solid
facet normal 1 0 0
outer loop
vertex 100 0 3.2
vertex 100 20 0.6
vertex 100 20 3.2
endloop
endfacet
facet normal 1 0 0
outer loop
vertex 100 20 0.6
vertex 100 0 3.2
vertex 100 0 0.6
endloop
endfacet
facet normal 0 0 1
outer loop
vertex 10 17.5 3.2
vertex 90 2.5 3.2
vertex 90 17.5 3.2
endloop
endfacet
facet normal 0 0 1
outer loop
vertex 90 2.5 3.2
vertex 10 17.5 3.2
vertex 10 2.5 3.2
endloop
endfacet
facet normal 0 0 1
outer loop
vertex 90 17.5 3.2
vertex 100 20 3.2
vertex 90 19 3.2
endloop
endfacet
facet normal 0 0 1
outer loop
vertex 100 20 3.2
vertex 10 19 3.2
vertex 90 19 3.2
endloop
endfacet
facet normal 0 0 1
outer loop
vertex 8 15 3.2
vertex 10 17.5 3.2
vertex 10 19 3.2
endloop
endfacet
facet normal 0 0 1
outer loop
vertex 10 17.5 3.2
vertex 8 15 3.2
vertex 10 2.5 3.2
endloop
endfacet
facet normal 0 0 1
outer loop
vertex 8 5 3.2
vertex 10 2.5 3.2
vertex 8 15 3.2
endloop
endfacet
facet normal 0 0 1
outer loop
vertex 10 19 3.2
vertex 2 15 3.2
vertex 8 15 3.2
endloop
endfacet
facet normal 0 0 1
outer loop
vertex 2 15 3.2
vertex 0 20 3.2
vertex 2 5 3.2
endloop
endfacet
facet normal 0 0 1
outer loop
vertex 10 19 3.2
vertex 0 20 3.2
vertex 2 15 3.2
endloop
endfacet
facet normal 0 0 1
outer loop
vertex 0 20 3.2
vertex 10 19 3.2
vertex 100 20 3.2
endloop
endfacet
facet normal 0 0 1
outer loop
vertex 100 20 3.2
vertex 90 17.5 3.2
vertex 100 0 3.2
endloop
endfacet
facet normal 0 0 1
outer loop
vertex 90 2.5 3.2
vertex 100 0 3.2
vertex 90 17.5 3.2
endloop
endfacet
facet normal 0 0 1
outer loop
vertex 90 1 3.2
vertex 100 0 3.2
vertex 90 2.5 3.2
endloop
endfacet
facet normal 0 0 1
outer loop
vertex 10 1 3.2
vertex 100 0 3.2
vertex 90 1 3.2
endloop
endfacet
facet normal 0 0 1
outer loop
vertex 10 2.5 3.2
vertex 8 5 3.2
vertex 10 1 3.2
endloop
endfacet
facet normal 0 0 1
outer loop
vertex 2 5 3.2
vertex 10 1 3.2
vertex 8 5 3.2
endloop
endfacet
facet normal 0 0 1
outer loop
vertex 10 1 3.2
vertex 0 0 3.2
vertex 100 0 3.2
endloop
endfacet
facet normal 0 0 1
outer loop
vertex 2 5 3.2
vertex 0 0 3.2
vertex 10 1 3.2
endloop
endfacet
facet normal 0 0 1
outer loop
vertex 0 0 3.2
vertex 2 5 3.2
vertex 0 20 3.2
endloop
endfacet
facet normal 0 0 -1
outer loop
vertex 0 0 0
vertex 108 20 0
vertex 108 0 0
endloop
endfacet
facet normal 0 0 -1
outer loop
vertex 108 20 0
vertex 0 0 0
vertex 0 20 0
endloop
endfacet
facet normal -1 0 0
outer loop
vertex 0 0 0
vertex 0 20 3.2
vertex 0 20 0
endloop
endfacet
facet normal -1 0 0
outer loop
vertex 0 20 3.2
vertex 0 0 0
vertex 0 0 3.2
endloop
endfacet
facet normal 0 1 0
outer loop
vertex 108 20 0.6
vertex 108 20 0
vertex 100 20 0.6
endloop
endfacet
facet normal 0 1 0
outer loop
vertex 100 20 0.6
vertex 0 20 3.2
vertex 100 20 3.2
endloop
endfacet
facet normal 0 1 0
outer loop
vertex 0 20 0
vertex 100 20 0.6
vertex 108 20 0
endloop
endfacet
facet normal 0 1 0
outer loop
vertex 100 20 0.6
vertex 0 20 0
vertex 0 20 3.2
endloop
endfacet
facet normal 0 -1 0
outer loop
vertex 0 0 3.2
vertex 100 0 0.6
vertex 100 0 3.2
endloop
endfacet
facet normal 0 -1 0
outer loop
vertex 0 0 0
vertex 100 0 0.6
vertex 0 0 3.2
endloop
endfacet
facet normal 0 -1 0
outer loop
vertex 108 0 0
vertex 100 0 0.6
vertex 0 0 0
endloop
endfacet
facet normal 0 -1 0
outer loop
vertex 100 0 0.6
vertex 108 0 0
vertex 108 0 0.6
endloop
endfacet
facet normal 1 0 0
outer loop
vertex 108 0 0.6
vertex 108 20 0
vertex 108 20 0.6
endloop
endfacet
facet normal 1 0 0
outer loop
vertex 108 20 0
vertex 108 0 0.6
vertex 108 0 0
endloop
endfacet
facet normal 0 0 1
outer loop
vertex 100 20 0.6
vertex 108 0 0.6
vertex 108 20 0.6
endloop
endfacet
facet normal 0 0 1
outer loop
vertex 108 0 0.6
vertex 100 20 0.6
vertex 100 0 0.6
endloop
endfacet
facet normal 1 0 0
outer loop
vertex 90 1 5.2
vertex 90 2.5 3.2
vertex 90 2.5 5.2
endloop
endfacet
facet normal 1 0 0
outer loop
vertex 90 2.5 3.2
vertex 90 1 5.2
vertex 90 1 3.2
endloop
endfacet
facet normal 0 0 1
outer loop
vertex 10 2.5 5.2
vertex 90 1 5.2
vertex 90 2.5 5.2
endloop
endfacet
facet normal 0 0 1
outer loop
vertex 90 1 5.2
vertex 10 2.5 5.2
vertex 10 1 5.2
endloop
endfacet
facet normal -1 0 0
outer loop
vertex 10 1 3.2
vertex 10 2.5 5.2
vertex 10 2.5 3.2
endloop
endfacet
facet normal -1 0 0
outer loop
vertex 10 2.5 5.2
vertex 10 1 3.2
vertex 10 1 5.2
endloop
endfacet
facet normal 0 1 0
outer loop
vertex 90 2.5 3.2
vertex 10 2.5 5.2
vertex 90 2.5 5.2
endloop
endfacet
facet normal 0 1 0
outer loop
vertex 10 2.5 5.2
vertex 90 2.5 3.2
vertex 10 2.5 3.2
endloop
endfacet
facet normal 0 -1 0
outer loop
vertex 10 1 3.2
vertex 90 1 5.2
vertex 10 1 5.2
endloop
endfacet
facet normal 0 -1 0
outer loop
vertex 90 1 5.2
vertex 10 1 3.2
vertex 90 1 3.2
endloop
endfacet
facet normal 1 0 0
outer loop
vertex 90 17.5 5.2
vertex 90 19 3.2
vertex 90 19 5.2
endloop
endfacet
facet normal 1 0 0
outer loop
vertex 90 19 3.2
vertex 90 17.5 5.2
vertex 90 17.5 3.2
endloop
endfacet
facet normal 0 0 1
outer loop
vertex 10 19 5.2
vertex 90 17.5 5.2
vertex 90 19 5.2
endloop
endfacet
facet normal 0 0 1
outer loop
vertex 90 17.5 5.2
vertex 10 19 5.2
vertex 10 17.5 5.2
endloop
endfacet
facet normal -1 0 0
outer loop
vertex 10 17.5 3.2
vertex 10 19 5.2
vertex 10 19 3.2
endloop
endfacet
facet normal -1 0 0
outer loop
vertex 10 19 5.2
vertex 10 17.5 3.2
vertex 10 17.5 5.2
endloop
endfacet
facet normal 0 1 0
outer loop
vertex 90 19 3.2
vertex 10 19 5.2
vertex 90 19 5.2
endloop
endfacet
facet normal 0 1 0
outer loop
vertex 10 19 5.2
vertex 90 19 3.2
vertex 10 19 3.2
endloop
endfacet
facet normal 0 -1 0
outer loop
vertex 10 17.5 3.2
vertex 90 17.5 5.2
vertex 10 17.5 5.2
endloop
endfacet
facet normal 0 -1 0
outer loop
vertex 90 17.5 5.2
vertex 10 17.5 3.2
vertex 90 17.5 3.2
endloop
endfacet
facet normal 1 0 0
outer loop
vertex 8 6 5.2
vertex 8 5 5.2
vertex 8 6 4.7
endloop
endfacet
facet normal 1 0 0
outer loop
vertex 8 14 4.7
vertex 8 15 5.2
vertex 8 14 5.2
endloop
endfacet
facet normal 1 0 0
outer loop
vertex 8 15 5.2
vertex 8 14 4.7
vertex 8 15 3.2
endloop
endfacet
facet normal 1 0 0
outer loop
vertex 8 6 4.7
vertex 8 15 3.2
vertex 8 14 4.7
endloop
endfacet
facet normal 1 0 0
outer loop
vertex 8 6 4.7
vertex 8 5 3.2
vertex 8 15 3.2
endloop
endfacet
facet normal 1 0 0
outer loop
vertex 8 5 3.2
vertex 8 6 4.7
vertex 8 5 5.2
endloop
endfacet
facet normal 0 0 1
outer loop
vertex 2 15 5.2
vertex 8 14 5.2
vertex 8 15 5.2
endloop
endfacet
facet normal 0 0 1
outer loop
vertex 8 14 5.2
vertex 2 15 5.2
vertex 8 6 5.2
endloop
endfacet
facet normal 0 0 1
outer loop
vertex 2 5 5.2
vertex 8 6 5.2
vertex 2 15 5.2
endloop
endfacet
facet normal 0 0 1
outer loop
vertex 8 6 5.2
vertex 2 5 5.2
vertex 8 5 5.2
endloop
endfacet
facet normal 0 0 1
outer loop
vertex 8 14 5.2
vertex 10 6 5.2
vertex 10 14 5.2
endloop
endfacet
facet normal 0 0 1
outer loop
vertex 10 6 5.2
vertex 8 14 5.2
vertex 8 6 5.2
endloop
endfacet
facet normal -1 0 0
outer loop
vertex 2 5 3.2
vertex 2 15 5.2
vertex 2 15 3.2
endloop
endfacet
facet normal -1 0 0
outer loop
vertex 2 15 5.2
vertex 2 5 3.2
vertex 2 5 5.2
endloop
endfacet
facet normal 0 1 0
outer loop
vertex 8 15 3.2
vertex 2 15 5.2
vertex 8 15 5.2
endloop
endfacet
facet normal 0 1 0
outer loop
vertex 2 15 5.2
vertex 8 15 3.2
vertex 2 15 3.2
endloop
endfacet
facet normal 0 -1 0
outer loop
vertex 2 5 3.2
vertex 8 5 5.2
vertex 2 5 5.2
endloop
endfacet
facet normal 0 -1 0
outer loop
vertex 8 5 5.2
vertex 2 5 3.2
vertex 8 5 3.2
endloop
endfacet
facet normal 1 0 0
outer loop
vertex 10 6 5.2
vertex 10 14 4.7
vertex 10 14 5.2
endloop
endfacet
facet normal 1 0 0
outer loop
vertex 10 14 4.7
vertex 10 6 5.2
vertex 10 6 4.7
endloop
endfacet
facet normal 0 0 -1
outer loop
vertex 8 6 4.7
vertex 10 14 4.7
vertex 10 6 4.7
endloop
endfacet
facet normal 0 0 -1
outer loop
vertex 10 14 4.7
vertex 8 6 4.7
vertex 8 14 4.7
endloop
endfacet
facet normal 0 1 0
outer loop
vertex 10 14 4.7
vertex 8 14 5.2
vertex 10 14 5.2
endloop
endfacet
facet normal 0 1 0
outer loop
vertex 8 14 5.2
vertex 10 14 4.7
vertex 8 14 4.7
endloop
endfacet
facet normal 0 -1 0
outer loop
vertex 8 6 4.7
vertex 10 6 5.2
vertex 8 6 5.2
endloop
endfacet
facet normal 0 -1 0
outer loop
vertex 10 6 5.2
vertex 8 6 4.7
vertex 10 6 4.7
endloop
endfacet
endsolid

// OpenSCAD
// Bag clip with living hinge - PETG, 0.4mm nozzle, no supports
// One piece, printed open flat. Lower arm + upper arm meet at hinge mid-plane.
// Fold map (180 about pivot): F(x) = 216 - x, F(z) = 10.4 - z.

part = "arm_lower"; // [arm_lower, arm_upper, assembly]
cadverify_only = "";

Lbody = 100;
Wbody = 20;
Tbody = 3.2;
Hhalf = 8;
Thinge = 0.6;
Bgap = 2.0;
Xpiv = 108;
Zpiv = 5.2;

module instance(name, part, unit = 1) {
    echo(cadverify_instance = [name, part, unit]);
    if (cadverify_only == "" || cadverify_only == name) children();
}

module arm_lower() {
    cube([Lbody, Wbody, Tbody], false);
    translate([Lbody-0.1, 0, 0])
        cube([Hhalf+0.1, Wbody, Thinge], false);
    translate([10, 1, Tbody-0.1])
        cube([80, 1.5, Bgap+0.1], false);
    translate([10, 17.5, Tbody-0.1])
        cube([80, 1.5, Bgap+0.1], false);
    translate([2, 5, Tbody-0.1])
        cube([6, 10, Bgap+0.1], false);
    translate([7.9, 6, 4.7])
        cube([2.1, 8, 0.5], false);
}

module arm_upper() {
    cube([Hhalf+0.1, Wbody, Thinge], false);
    translate([Hhalf-0.1, 0, 0])
        cube([Lbody+0.1, Wbody, Tbody], false);
    translate([100, 5, Tbody-0.1])
        cube([6, 10, Bgap+0.1], false);
    translate([97.9, 6, 4.7])
        cube([2.5, 8, 0.5], false);
    translate([107.9, 6, 0])
        cube([8.1, 8, Tbody], false);
}

if (part == "arm_lower") {
    echo(cadverify_spec = [
        ["bounds", [[0, 0, 0], [108, 20, 5.2]]],
        ["bodies", 1],
        ["through_holes", 0],
        ["support_faces", [["bed", "-z", 1500]]],
        ["overhangs_allowed", [["latch lip", [[7.5, 5.5, 4.5], [10.5, 14.5, 5.5]]]]],
        ["copies", 1],
        ["details", [
            ["arm", "material", [[20, 6, 1.0], [80, 14, 2.2]], 1],
            ["arm_wall", "thickness", [50, 10, 10], [0, 0, -1], 3.2],
            ["hinge", "thickness", [104, 10, 5], [0, 0, -1], 0.6],
            ["rib", "material", [[20, 1.2, 3.5], [80, 2.3, 5.0]], 1],
            ["latch_tower", "material", [[3, 6, 3.5], [7, 14, 5.0]], 1],
            ["latch_lip", "material", [[8.2, 7, 4.8], [9.7, 13, 5.1]], 1],
            ["bag_slot", "void", [[20, 3, 3.5], [80, 17, 5.0]], 1]
        ]]
    ]);
    arm_lower();
} else if (part == "arm_upper") {
    echo(cadverify_spec = [
        ["bounds", [[0, 0, 0], [116, 20, 5.2]]],
        ["bodies", 1],
        ["through_holes", 0],
        ["support_faces", [["bed", "-z", 1500]]],
        ["overhangs_allowed", [["latch lip", [[97.5, 5.5, 4.5], [100.8, 14.5, 5.5]]]]],
        ["copies", 1],
        ["details", [
            ["arm", "material", [[15, 6, 1.0], [80, 14, 2.2]], 1],
            ["arm_wall", "thickness", [50, 10, 10], [0, 0, -1], 3.2],
            ["hinge", "thickness", [4, 10, 5], [0, 0, -1], 0.6],
            ["latch_tower", "material", [[100.5, 6, 3.5], [105.5, 14, 5.0]], 1],
            ["latch_lip", "material", [[98.2, 7, 4.8], [100.1, 13, 5.1]], 1],
            ["thumb_tab", "material", [[108.5, 7, 1.0], [115, 13, 2.2]], 1],
            ["field", "void", [[15, 3, 3.5], [80, 17, 5.0]], 1]
        ]]
    ]);
    arm_upper();
} else if (part == "assembly") {
    echo(cadverify_spec = [
        ["bounds", [[0, 0, 0], [224, 20, 5.2]]],
        ["support_faces", [["bed", "-z", 3000]]],
        ["motions", [
            ["close", ["upper"], "rotate", [108, 10, 5.2], [0, -1, 0], [0, 180],
                ["flex", [["upper", "lower", 1.0, "latch snap"]]],
                ["stops", [180]]
            ]
        ]],
        ["assembly_order", [
            [["lower"], [0, 0, 0]],
            [["upper"], [0, 0, -1]]
        ]]
    ]);
    instance("lower", "arm_lower") arm_lower();
    instance("upper", "arm_upper") translate([108, 0, 0]) arm_upper();
}
